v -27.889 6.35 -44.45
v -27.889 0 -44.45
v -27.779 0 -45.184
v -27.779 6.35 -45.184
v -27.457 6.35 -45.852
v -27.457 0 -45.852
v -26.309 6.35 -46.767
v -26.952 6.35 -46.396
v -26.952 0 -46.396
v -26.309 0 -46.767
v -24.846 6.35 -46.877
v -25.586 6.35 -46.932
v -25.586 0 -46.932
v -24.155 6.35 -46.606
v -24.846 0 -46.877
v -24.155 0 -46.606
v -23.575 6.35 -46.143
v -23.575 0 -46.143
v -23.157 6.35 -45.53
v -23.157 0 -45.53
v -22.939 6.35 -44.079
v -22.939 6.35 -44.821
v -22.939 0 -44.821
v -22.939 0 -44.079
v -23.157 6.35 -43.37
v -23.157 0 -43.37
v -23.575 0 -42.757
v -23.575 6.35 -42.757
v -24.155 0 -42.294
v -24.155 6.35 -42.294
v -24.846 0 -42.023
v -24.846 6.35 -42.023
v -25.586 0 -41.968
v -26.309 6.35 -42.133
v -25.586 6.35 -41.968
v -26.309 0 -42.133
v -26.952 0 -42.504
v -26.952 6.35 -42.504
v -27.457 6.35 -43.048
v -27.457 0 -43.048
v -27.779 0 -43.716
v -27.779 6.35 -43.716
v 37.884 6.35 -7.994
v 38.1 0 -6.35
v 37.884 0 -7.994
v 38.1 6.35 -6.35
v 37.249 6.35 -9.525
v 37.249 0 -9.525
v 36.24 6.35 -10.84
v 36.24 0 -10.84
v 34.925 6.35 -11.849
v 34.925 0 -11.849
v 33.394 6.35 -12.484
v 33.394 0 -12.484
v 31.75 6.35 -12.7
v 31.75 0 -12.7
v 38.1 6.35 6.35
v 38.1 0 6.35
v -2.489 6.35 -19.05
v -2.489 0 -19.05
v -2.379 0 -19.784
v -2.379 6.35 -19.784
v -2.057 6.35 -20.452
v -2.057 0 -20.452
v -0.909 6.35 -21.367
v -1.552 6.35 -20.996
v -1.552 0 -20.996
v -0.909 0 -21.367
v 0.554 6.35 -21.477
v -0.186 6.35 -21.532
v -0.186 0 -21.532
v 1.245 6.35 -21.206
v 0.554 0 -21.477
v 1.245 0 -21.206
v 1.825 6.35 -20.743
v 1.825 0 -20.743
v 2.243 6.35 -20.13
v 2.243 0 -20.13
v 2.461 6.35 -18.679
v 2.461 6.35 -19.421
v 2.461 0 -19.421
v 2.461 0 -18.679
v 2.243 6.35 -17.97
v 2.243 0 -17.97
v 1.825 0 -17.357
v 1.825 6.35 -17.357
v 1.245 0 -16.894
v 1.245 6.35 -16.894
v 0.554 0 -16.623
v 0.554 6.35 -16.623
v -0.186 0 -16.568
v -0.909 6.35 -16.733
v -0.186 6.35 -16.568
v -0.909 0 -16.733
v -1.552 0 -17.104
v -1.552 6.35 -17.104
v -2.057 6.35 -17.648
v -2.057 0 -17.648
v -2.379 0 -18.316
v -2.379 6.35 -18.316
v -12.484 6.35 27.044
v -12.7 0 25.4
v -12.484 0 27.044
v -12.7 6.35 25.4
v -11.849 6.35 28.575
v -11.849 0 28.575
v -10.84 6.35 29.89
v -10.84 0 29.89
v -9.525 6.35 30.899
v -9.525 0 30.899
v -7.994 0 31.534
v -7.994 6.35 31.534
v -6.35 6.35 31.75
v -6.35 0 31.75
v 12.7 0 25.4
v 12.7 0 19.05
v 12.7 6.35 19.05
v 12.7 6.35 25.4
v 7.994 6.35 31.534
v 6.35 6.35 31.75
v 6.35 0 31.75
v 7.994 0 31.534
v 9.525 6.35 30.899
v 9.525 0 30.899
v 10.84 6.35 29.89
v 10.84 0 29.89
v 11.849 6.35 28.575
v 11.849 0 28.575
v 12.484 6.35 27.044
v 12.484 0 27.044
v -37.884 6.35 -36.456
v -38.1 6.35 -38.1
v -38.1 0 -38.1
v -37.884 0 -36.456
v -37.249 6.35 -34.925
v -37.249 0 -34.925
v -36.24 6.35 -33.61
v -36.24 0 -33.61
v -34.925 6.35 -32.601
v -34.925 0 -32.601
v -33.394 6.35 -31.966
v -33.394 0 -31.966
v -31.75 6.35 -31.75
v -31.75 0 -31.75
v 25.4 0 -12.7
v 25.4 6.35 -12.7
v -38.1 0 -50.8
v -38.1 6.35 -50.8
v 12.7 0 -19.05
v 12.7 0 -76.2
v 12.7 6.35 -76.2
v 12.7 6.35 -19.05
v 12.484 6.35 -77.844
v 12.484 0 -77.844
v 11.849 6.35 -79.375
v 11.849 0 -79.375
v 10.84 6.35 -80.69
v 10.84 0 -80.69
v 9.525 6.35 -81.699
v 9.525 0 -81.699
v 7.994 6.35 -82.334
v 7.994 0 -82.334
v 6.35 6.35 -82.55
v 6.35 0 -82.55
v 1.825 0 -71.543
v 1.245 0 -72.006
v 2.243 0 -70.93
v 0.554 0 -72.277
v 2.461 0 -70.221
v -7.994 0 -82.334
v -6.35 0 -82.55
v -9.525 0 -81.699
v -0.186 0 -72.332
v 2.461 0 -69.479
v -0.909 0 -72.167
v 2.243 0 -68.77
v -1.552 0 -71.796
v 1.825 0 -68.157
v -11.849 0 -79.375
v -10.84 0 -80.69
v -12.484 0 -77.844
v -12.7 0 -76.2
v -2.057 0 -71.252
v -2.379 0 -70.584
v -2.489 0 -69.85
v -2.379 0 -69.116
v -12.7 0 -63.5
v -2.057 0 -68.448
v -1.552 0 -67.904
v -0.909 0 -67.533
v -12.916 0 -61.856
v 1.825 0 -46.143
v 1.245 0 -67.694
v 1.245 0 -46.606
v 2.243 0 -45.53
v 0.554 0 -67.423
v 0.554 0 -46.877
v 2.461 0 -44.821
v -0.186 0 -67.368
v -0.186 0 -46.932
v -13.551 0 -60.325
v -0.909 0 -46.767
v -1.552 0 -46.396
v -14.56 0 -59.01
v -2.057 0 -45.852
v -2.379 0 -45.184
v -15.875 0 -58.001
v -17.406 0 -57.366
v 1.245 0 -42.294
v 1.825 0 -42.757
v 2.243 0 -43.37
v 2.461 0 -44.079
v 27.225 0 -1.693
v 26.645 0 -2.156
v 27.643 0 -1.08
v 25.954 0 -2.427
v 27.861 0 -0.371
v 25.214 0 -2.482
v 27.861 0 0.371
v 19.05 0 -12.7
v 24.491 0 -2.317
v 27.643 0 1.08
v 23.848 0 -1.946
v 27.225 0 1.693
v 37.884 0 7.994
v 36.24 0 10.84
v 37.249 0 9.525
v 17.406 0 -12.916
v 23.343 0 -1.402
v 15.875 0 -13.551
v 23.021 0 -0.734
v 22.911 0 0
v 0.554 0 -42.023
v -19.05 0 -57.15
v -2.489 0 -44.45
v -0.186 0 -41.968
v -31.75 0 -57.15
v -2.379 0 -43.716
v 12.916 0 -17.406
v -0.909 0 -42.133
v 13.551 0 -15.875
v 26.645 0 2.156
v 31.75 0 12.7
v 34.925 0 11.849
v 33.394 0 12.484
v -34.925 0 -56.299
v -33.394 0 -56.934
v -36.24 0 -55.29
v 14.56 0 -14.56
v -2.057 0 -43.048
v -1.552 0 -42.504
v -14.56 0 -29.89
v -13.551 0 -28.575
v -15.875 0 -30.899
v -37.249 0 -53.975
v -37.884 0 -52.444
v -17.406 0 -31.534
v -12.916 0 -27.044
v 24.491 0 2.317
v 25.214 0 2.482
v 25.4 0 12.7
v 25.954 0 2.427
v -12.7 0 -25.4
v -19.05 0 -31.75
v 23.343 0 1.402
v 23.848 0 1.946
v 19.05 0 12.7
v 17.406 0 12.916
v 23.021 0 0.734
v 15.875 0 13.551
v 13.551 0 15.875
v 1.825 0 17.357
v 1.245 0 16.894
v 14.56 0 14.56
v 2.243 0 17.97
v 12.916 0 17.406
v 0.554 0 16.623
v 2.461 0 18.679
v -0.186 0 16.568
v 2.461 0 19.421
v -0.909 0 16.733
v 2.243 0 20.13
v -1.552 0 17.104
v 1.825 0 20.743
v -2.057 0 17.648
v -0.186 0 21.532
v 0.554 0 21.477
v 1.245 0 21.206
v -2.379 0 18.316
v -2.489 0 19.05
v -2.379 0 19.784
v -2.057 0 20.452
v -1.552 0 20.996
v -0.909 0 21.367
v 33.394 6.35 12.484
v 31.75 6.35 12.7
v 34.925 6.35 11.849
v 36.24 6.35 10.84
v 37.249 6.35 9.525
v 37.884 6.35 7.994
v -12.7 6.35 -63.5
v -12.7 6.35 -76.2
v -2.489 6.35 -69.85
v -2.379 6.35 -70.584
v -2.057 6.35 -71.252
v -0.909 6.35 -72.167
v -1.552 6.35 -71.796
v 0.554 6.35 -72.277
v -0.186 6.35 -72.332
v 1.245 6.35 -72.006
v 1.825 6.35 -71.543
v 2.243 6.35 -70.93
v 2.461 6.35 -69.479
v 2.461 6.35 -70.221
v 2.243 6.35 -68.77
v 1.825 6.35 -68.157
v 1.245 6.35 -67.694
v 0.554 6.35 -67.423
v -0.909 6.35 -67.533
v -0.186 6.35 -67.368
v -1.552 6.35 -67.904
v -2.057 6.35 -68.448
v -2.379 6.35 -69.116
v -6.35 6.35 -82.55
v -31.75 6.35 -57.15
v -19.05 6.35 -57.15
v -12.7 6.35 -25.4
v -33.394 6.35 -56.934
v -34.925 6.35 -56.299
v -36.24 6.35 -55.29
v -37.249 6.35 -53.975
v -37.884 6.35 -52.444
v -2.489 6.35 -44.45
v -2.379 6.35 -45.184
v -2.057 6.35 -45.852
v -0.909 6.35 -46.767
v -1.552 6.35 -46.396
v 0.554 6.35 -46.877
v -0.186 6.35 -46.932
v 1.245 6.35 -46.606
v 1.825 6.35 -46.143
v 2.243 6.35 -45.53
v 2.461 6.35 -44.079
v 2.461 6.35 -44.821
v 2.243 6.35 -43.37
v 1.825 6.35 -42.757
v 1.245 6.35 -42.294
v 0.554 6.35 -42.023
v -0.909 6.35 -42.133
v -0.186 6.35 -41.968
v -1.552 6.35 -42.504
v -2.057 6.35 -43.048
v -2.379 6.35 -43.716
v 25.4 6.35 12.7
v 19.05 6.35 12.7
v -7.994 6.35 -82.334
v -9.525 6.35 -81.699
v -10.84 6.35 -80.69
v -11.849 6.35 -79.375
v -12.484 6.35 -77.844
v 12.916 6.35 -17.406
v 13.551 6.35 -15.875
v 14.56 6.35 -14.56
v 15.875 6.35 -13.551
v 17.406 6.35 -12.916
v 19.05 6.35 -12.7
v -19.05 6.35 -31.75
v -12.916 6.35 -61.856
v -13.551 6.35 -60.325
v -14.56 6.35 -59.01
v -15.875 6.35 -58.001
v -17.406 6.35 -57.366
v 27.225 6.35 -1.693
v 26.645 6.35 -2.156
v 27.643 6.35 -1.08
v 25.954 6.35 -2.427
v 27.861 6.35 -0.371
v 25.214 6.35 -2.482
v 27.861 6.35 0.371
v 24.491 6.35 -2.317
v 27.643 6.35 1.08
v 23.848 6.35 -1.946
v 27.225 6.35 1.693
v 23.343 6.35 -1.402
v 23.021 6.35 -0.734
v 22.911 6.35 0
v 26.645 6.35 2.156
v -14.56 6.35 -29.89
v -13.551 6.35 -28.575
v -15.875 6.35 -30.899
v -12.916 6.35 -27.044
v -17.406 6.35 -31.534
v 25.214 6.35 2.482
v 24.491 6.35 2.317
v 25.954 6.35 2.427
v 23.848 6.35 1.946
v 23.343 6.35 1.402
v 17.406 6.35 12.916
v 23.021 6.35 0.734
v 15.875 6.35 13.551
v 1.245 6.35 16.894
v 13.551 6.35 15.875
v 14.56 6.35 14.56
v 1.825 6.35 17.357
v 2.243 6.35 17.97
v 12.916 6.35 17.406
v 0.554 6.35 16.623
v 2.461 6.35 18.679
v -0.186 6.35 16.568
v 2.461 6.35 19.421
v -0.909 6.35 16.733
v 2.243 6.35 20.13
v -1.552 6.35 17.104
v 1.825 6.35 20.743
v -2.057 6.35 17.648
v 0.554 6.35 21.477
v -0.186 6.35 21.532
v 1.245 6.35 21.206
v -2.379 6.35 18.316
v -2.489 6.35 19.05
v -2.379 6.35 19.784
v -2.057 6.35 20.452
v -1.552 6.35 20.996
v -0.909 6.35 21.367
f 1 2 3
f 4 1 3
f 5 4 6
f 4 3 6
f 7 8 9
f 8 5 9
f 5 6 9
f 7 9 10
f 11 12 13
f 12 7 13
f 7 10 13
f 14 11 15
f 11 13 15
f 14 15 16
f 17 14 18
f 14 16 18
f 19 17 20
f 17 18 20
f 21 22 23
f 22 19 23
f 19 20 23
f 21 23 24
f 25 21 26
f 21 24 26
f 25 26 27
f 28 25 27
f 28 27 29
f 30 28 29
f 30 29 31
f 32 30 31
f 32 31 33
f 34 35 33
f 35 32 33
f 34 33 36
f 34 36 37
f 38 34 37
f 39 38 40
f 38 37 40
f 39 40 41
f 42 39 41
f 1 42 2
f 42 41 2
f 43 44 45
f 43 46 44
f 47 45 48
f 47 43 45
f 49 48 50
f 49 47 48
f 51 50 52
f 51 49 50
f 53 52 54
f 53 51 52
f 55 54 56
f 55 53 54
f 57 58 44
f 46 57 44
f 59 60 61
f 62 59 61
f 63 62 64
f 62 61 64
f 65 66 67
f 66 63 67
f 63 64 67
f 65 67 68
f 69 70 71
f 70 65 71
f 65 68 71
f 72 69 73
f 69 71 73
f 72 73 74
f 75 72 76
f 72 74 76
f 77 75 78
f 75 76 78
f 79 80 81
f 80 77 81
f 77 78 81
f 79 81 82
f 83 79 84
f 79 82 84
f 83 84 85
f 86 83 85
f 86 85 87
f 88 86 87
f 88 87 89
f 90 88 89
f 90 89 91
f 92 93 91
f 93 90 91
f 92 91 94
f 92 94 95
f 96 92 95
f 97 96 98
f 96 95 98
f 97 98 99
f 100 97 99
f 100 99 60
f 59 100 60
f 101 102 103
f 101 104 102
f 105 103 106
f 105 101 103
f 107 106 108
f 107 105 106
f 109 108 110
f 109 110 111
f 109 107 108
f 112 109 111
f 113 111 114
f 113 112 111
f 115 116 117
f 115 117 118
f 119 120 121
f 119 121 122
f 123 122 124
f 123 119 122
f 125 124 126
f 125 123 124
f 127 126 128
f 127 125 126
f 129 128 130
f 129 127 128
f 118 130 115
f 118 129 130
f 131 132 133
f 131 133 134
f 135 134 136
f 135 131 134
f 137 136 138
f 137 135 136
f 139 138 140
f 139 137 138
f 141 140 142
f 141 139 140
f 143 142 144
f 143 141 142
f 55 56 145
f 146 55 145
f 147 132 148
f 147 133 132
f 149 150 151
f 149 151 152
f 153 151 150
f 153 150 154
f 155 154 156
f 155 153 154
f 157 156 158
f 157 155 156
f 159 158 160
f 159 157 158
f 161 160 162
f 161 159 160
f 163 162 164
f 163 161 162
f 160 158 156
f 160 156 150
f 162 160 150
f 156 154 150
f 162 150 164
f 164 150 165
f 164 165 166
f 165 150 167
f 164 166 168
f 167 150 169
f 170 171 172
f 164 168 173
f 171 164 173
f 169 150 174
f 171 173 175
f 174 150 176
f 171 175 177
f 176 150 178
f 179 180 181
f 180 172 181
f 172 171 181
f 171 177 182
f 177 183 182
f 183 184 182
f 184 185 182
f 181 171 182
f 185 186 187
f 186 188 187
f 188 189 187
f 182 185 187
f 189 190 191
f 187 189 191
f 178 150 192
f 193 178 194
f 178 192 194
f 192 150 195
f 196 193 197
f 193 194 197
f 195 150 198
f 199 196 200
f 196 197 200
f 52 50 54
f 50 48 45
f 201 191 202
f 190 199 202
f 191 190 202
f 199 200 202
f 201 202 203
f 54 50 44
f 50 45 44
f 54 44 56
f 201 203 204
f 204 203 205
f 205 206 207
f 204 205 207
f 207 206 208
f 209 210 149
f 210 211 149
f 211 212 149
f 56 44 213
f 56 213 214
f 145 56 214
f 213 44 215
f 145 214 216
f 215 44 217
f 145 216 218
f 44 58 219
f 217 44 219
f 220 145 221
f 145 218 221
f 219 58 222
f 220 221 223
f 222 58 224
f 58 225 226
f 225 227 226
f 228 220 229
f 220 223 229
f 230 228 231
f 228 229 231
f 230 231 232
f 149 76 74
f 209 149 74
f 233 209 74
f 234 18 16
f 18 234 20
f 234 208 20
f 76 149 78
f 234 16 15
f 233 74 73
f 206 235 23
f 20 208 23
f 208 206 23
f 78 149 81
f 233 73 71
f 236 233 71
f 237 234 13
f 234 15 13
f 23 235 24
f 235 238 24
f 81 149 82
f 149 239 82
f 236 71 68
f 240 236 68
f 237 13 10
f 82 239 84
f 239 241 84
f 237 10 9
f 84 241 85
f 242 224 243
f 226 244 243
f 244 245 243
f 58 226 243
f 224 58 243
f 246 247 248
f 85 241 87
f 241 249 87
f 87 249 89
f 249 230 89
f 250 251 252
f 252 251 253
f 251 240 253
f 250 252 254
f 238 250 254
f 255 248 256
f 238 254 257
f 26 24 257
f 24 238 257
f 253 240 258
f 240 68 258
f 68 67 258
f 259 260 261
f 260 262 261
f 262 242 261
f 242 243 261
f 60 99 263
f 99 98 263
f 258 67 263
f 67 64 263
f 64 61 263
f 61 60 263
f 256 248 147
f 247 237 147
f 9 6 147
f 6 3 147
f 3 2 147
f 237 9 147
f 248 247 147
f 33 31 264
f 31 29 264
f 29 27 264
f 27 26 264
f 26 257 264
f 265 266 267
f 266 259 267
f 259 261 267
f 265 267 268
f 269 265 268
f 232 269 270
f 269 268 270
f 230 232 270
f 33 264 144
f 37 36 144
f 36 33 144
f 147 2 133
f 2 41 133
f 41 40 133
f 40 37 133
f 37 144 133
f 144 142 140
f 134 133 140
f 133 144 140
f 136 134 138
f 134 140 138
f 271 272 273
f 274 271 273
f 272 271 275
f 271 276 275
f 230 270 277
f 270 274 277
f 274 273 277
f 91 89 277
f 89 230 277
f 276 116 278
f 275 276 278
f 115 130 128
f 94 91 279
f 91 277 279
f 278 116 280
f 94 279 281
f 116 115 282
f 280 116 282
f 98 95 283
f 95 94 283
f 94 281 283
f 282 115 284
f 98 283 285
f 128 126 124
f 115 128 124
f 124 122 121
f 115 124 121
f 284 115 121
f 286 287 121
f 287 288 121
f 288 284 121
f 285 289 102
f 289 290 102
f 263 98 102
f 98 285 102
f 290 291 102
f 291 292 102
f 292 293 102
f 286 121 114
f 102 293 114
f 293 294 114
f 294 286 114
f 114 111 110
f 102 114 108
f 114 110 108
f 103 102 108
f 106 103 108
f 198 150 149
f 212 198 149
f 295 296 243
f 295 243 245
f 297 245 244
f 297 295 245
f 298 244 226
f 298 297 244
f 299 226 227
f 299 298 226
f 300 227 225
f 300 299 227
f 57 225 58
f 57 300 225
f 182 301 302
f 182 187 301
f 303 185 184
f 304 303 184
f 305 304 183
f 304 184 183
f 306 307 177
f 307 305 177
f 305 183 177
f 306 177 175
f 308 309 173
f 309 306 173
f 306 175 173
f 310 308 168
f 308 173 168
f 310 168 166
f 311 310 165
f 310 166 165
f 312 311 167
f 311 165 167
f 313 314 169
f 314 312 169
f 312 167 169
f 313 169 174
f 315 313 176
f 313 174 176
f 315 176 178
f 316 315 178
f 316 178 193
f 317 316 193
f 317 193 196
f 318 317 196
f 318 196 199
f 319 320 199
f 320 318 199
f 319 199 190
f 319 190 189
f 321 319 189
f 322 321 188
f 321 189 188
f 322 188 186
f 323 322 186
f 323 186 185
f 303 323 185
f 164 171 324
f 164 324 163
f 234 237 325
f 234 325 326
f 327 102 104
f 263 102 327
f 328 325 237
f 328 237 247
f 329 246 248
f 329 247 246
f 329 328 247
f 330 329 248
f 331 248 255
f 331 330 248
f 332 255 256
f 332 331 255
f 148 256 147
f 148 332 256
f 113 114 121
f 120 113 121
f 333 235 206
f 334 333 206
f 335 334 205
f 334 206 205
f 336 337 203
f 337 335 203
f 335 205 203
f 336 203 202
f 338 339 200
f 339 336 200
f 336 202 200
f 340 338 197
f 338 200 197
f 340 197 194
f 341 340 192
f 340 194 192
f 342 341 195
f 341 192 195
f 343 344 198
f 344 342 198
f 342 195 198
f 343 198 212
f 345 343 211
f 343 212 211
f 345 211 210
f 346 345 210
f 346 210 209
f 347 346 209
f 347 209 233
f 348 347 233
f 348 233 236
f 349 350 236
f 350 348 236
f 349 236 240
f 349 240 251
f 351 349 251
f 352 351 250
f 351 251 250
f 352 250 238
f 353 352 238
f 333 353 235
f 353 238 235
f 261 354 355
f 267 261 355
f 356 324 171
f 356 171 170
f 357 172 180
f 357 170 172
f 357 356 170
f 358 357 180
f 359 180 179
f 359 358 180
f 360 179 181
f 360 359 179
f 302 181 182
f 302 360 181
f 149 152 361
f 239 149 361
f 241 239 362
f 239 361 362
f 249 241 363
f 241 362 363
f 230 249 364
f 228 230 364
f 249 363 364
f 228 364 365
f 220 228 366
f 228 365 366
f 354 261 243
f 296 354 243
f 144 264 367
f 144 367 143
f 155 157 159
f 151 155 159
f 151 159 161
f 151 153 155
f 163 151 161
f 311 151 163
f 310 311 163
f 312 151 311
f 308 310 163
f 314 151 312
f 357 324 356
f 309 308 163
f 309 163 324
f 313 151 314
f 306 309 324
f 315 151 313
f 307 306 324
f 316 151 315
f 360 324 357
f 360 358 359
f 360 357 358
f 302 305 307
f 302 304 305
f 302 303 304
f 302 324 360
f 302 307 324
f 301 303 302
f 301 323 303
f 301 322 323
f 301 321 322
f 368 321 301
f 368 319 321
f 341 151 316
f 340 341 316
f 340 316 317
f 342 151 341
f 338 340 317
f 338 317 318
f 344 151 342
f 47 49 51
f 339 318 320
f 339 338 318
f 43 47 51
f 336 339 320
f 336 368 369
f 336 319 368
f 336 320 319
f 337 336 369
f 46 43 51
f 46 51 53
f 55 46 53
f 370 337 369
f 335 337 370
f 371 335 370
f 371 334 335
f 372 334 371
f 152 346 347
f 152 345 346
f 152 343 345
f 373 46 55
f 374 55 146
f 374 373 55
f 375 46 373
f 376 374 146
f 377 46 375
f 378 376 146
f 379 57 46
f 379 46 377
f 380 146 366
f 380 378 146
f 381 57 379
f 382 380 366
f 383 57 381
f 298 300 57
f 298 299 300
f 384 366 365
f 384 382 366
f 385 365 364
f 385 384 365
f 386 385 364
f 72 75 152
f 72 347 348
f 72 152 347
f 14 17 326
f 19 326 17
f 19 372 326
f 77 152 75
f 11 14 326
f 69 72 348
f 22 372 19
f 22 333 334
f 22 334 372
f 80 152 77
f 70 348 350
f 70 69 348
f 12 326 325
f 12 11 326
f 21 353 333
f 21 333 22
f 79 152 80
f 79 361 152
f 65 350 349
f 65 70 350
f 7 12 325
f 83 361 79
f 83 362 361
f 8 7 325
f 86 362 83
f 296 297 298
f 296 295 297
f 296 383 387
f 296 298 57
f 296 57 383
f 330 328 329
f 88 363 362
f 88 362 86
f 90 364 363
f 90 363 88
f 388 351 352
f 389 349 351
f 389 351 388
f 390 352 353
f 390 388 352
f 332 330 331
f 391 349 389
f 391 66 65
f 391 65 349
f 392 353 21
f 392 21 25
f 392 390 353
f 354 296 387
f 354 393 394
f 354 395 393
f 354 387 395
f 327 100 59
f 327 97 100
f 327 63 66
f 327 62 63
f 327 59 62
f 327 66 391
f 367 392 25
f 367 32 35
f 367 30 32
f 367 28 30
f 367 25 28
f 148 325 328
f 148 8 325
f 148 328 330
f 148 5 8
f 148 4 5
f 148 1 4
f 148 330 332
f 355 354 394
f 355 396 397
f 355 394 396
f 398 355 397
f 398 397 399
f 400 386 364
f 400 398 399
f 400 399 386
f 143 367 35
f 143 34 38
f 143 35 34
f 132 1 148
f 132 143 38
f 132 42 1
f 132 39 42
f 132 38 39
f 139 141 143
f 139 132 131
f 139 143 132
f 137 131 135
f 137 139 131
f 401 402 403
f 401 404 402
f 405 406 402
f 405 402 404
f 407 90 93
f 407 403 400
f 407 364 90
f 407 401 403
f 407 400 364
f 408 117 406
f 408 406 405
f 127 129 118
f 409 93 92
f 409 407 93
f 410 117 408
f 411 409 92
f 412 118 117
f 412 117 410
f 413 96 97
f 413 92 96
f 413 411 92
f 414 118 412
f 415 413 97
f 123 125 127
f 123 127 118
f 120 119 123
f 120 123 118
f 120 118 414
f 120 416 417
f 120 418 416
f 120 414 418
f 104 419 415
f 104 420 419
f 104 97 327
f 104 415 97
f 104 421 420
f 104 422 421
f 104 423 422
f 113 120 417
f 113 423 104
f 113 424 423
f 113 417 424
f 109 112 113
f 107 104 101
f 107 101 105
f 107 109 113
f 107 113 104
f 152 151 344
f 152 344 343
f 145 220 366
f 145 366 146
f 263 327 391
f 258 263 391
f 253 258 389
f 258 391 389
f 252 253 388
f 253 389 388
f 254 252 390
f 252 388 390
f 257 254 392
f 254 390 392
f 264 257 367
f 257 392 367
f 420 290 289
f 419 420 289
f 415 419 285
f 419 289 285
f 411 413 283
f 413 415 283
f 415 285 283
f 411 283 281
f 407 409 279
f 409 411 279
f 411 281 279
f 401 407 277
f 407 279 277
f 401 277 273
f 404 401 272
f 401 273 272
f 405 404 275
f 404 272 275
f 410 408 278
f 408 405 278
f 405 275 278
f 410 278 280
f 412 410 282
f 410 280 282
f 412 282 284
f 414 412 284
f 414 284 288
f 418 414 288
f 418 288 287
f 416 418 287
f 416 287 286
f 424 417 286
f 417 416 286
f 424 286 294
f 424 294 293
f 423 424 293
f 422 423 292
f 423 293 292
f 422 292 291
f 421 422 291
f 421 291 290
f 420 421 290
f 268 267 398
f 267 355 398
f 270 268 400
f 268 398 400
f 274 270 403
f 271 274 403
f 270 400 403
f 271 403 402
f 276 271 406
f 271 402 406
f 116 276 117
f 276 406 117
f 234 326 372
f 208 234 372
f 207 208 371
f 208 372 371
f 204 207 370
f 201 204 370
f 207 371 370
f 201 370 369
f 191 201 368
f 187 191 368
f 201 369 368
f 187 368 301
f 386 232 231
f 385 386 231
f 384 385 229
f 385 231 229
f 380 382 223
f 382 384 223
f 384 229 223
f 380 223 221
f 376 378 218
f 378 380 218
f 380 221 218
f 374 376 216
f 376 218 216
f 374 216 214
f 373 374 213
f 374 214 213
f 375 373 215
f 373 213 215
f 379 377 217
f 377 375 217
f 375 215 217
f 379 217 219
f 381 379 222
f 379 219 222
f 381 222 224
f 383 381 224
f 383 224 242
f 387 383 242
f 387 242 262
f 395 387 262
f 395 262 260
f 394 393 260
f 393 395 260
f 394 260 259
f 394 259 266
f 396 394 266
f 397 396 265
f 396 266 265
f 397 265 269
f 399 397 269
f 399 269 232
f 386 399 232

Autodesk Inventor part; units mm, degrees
ref_plane "YZ Plane" through (0, 0, 0) normal (1, 0, 0) x (0, 1, 0)
ref_plane "XZ Plane" through (0, 0, 0) normal (0, 1, 0) x (-1, 0, 0)
ref_plane "XY Plane" through (0, 0, 0) normal (0, 0, 1) x (1, 0, 0)
sketch "Sketch1" plane through (0, 0, 0) normal (0, 1, 0) x (-1, 0, 0)
  line L0 (0, 6.35) -> (0, -6.35) construction
  line L1 (0, 0) -> (-6.35, 0) construction
  line L2 (0, -6.35) -> (0, -44.45) construction
  line L3 (0, -44.45) -> (12.7, -44.45) construction
  line L4 (0, -44.45) -> (0, -69.85) construction
  line L5 (-6.35, 0) -> (-12.7, 0) construction
  line L6 (0, 6.35) -> (0, 31.75) construction
  circle A0 centre (0, 31.75) radius 2.4892 construction
  circle A1 centre (0, 19.05) radius 2.4892
  circle A2 centre (0, 6.35) radius 2.4892 construction
  circle A3 centre (0, -6.35) radius 2.4892 construction
  circle A4 centre (0, -19.05) radius 2.4892
  circle A5 centre (0, -31.75) radius 2.4892 construction
  circle A6 centre (0, -44.45) radius 2.4892
  circle A7 centre (0, -57.15) radius 2.4892 construction
  circle A8 centre (0, -69.85) radius 2.4892
  circle A9 centre (12.7, -44.45) radius 2.4892 construction
  line L7 (12.7, -44.45) -> (38.1, -44.45) construction
  circle A10 centre (25.4, -44.45) radius 2.4892
  circle A11 centre (38.1, -44.45) radius 2.4892 construction
  line L8 (12.7, 31.75) -> (-12.7, 31.75)
  line L9 (12.7, 31.75) -> (12.7, -31.75)
  line L10 (12.7, -31.75) -> (38.1, -31.75)
  line L11 (38.1, -31.75) -> (38.1, -57.15)
  line L12 (38.1, -57.15) -> (12.7, -57.15)
  line L13 (12.7, -57.15) -> (12.7, -82.55)
  line L14 (12.7, -82.55) -> (-12.7, -82.55)
  line L15 (-12.7, -82.55) -> (-12.7, -12.7)
  line L16 (-12.7, -12.7) -> (-25.4, -12.7)
  line L17 (-25.4, -12.7) -> (-25.4, 12.7) construction
  line L18 (-25.4, 12.7) -> (-12.7, 12.7)
  line L19 (-12.7, 12.7) -> (-12.7, 31.75)
  circle A12 centre (-25.4, 0) radius 2.4892
  line L20 (-25.4, 12.7) -> (-38.1, 12.7)
  line L21 (-38.1, 12.7) -> (-38.1, -12.7)
  line L22 (-38.1, -12.7) -> (-25.4, -12.7)
  point P0 (0, 31.75)
  point P1 (0, -82.55)
  dimension "d0" = 12.7
  dimension "d1" = 6.35
  dimension "d2" = 38.1
  dimension "d3" = 12.7
  dimension "d4" = 25.4
  dimension "d6" = 25.4
  dimension "d15" = 4.9784
  dimension "d18" = 12.7
  dimension "d23" = 4.9784
  dimension "d24" = 25.4
  dimension "d27" = 12.7
  dimension "d32" = 25.4
  dimension "d33" = 12.7
  dimension "d34" = 12.7
  dimension "d36" = 12.7
  dimension "d40" = 4.9784
  dimension "d41" = 12.7
extrude "Extrusion1" add sketch "Sketch1" along normal blind 6.35
fillet "Fillet1" radius 6.35 12 edges at (-12.7, 3.175, 31.75) (12.7, 3.175, 31.75) (12.7, 3.175, 12.7) (-12.7, 3.175, -31.75) (-38.1, 3.175, -31.75) (-38.1, 3.175, -57.15) (-12.7, 3.175, -57.15) (-12.7, 3.175, -82.55) (12.7, 3.175, -82.55) (12.7, 3.175, -12.7) (38.1, 3.175, 12.7) (38.1, 3.175, -12.7)
properties part number "STRU_021_DVBSBracket2" material "Aluminum 6061"
